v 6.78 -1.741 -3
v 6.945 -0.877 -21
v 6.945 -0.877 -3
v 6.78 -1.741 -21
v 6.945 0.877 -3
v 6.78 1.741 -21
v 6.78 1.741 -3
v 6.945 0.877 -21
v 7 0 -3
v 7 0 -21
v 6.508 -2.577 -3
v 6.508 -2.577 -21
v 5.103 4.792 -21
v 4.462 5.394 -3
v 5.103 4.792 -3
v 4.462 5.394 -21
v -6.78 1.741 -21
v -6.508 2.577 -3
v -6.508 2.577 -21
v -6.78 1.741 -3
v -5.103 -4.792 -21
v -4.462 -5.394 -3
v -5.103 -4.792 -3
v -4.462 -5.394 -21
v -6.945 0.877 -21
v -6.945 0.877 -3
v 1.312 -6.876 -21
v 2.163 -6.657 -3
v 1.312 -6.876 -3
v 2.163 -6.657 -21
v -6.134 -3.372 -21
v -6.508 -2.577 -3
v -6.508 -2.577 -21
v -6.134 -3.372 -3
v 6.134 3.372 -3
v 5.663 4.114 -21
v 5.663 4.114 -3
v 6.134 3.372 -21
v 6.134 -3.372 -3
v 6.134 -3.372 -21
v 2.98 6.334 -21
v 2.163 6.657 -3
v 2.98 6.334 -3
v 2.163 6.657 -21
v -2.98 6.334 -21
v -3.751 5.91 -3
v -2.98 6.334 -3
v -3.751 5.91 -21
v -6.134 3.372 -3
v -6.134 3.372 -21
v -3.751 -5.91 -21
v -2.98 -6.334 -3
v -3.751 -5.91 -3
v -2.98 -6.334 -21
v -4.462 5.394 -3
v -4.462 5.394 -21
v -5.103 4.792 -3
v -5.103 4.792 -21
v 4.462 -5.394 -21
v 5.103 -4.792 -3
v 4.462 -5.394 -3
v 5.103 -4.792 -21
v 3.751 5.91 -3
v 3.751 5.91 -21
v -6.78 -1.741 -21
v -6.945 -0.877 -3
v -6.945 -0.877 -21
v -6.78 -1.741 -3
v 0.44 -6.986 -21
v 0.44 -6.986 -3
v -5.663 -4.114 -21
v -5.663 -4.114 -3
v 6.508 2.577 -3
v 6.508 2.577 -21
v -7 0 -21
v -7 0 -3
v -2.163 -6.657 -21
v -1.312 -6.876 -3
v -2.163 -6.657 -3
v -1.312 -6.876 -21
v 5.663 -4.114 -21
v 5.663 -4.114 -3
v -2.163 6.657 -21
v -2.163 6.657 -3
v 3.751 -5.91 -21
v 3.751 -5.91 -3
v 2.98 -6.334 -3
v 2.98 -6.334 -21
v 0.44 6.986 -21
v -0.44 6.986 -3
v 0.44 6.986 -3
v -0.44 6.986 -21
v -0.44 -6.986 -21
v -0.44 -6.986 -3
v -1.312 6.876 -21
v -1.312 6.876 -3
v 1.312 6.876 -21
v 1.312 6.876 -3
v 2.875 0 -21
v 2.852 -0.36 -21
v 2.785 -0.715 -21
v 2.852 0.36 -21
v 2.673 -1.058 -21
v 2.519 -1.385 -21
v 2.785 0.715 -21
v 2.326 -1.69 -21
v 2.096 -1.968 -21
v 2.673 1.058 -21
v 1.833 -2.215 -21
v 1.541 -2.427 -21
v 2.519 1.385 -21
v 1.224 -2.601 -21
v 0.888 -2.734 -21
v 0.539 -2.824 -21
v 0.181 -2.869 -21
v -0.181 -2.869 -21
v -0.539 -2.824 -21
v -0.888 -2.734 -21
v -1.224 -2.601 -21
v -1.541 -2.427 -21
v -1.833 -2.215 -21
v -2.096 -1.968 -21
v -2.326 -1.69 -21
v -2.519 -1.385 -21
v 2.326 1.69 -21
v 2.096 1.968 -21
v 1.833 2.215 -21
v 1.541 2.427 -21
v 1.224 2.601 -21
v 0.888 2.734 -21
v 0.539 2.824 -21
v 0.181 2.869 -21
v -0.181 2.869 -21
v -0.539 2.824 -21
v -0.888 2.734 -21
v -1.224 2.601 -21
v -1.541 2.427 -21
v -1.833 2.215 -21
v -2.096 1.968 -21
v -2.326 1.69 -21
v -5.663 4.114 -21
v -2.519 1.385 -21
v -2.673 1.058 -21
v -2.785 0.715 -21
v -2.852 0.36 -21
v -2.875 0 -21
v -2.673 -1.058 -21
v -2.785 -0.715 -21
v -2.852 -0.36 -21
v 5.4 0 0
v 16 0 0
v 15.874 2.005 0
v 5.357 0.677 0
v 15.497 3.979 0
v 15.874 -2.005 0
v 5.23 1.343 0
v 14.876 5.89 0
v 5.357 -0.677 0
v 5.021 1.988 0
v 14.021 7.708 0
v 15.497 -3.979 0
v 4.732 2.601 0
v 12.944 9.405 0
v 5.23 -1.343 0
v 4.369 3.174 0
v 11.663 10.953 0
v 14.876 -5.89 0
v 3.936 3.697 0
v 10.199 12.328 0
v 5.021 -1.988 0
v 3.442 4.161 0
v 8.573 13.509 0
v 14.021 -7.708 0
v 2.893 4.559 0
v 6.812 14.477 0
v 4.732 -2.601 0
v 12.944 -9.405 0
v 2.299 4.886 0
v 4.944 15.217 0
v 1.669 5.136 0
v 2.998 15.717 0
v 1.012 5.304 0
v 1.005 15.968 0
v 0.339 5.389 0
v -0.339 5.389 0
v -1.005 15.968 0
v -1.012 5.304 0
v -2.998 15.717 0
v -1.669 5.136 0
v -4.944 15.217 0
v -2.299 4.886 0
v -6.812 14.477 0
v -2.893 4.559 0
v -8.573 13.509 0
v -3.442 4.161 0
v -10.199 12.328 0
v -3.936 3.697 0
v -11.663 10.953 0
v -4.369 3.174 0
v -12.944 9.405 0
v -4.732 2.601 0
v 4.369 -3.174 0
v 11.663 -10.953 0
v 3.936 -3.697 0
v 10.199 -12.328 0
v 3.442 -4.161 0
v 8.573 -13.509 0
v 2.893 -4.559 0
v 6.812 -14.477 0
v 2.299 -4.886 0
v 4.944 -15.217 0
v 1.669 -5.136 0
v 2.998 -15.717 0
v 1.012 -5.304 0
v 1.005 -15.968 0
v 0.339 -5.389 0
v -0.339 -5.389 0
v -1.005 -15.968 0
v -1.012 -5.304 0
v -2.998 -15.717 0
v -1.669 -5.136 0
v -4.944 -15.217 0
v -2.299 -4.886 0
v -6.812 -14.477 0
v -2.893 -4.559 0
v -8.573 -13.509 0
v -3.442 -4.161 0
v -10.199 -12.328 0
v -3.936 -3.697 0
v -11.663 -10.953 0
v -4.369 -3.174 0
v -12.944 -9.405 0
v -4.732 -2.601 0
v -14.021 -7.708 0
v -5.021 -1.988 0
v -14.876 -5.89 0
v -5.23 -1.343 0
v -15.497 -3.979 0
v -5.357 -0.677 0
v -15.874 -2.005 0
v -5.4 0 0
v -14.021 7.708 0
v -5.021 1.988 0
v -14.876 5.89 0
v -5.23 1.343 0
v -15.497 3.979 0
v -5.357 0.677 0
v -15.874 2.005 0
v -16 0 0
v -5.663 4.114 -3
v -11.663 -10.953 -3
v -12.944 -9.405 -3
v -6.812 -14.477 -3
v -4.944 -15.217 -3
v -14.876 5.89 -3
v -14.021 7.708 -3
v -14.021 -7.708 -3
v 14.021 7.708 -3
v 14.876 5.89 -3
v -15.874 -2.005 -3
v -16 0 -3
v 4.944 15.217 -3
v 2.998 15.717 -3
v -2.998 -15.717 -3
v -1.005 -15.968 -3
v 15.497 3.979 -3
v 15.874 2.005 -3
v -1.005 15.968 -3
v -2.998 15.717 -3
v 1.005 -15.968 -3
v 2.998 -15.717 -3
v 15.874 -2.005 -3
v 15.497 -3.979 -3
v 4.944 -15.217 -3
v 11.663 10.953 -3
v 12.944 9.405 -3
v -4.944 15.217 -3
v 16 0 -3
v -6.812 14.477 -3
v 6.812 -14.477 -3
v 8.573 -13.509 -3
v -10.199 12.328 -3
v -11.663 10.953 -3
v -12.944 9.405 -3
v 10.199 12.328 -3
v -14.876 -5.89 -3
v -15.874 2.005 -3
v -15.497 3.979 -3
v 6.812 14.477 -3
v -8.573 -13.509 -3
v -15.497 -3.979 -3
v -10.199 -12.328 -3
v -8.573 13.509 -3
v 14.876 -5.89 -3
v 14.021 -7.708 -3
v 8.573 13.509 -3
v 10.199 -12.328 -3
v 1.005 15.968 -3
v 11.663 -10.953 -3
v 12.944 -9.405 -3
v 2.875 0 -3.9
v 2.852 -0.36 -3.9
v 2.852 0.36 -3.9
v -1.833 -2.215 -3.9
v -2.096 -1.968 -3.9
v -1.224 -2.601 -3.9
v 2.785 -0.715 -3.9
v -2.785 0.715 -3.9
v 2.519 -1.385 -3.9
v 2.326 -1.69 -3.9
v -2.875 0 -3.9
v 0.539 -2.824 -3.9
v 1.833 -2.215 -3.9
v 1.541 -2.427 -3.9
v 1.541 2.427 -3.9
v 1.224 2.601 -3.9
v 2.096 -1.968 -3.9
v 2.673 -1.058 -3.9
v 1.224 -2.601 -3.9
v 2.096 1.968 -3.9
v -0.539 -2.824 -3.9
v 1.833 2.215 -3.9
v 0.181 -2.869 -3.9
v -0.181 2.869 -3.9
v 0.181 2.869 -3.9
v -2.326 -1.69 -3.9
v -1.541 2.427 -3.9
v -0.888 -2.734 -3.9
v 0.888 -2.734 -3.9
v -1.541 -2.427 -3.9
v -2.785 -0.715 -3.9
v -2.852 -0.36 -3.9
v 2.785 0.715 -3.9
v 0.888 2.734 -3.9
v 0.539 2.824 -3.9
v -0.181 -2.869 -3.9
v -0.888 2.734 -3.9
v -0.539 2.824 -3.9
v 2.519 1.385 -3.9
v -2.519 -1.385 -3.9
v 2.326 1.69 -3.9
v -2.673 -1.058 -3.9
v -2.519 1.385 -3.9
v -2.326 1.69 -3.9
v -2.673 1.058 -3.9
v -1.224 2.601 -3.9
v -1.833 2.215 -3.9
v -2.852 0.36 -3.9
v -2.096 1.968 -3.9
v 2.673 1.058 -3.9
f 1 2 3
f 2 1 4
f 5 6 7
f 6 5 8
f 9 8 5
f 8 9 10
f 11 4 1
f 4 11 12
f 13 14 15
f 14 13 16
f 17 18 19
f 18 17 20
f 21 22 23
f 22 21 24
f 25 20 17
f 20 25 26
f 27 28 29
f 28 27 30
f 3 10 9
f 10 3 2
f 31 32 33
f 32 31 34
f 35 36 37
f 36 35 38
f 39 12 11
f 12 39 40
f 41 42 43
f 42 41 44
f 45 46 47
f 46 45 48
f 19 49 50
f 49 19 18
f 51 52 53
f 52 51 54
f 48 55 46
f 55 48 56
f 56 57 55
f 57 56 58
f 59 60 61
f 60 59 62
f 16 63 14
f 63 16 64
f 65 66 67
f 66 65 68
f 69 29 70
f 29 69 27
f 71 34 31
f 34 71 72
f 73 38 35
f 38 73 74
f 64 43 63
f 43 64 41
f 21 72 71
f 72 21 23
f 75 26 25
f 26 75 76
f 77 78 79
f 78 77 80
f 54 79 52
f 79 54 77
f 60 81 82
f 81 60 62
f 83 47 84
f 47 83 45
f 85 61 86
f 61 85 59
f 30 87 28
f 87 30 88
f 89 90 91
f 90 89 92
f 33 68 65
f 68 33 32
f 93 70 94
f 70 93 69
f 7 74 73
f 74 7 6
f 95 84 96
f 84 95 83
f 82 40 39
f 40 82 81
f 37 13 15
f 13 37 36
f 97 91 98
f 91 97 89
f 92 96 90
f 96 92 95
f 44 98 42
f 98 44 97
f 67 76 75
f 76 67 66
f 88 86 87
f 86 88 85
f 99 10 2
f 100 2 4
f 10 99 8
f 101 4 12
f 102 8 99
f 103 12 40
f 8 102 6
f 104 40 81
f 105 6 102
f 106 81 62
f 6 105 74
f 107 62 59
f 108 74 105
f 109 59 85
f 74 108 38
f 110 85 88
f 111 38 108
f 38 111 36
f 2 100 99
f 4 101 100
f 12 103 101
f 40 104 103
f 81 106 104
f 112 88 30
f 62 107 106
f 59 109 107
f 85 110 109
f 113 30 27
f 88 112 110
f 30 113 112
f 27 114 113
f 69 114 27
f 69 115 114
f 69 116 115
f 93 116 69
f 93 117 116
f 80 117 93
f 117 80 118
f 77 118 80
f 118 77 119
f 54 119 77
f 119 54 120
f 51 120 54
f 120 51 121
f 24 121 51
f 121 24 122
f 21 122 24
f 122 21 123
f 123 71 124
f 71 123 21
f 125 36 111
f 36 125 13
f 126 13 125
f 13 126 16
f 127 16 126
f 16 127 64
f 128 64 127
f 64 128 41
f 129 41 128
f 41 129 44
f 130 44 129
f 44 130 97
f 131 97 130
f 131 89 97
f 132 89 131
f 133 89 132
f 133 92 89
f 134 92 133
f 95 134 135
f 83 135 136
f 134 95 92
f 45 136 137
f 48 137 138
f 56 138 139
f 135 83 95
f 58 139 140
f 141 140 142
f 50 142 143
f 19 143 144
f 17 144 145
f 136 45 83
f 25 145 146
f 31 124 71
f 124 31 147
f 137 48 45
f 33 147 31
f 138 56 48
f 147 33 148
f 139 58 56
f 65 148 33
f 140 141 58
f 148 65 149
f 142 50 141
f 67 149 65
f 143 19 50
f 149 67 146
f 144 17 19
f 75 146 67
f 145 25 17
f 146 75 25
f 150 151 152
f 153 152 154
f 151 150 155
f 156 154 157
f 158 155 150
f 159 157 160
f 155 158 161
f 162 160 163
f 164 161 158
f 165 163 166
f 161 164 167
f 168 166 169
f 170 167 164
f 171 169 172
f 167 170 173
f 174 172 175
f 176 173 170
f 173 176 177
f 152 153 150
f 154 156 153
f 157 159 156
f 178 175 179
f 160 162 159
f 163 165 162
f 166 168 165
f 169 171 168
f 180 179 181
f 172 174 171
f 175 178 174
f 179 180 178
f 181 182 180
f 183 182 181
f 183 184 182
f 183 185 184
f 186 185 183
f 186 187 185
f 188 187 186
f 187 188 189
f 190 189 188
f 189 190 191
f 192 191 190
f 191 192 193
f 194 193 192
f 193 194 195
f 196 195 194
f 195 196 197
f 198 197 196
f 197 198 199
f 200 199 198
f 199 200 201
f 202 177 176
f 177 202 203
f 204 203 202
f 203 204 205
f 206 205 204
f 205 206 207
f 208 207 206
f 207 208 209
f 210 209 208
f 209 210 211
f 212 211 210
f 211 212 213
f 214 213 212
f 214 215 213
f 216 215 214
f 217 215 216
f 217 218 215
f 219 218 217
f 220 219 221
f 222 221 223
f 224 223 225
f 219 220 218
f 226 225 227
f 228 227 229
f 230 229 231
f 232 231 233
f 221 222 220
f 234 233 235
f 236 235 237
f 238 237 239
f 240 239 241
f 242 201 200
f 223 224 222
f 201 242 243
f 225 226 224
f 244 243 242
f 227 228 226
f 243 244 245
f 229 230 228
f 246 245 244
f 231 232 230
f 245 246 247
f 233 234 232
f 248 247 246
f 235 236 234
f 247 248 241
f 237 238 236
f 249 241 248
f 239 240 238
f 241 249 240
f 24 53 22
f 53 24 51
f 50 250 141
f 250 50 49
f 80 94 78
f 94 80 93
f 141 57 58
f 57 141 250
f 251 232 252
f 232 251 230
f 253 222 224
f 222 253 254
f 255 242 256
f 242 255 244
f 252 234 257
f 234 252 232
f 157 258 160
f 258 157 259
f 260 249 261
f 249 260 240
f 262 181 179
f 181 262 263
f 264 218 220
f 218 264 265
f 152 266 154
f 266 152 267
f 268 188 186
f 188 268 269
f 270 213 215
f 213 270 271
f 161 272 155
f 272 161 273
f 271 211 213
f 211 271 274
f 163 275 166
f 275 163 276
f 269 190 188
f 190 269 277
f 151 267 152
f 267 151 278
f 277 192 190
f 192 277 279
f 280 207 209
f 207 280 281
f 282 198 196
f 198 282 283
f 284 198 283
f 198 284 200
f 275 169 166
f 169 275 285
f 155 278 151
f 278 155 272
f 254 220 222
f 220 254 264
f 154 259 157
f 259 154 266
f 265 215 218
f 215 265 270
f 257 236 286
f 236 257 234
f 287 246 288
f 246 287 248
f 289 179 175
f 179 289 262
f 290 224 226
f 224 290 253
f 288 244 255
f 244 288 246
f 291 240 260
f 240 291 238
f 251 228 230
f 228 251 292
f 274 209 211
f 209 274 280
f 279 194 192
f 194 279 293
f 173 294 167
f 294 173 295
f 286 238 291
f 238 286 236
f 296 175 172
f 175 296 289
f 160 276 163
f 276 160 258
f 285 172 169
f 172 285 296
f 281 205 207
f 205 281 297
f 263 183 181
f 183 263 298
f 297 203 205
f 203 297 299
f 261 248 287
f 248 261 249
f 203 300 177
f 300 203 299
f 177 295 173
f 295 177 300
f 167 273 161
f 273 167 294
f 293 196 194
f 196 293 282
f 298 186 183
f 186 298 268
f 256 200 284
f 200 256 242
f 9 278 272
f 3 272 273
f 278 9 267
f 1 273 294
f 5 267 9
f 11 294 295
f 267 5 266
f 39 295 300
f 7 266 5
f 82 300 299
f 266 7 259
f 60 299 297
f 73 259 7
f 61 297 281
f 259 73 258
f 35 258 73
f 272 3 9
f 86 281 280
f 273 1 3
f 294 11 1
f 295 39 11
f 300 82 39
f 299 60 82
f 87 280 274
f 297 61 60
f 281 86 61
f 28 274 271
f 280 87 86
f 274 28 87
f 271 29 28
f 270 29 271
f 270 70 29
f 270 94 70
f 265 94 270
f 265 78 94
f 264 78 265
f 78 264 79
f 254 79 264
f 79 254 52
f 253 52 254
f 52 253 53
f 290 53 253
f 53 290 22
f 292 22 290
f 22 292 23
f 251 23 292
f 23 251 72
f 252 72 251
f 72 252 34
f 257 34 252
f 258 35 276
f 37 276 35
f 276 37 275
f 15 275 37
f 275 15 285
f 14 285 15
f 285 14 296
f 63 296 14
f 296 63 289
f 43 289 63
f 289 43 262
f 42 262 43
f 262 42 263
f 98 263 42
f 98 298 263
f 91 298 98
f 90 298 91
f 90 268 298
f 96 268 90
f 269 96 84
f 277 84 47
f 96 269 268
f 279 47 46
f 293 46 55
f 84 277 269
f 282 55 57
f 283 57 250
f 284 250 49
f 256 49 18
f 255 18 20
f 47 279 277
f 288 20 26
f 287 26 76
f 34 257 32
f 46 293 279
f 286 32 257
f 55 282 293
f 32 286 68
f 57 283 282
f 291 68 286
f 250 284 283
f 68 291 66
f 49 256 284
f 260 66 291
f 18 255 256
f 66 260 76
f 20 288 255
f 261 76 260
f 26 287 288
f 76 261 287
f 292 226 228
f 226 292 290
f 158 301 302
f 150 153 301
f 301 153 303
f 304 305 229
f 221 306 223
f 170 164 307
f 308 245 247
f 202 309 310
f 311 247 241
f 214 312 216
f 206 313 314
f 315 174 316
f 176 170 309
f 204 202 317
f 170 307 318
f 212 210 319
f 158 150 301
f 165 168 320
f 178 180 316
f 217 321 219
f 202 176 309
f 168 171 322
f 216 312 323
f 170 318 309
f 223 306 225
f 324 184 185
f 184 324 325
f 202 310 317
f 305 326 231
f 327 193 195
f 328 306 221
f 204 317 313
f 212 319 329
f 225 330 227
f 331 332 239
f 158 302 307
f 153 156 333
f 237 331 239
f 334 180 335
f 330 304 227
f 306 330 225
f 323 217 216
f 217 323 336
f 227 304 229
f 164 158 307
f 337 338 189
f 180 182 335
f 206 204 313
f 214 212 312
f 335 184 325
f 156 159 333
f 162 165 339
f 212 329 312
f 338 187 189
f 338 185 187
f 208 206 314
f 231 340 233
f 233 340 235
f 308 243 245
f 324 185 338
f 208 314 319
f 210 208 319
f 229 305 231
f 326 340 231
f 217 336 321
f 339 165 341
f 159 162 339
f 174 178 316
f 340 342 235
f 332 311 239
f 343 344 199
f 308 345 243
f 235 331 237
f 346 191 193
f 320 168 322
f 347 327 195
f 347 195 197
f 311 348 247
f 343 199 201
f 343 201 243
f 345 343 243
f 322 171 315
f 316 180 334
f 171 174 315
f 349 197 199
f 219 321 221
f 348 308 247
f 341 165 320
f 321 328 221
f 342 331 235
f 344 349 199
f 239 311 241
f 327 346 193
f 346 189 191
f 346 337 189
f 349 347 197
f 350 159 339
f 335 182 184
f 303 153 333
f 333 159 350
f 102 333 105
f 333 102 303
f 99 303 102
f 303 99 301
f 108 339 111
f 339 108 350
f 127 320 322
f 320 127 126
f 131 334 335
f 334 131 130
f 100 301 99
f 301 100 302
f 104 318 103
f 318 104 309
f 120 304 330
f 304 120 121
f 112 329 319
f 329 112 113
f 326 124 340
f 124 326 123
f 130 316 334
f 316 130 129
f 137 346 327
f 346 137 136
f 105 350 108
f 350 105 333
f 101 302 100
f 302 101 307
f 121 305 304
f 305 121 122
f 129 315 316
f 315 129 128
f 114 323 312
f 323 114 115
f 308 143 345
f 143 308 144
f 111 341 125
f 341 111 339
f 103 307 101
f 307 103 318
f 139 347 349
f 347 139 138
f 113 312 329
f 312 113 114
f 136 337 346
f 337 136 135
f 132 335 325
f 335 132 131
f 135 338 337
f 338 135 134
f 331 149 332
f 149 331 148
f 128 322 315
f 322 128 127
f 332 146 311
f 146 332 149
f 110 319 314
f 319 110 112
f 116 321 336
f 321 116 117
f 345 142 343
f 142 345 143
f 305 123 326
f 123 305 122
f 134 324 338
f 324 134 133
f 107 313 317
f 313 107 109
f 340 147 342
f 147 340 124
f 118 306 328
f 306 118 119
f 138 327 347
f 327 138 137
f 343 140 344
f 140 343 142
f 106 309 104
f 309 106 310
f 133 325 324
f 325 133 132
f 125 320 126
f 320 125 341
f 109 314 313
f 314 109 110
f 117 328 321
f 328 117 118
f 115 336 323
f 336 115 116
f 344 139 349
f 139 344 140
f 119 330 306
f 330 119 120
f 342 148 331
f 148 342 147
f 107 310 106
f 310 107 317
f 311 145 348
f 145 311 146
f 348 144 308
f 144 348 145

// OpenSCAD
$fn = 50;


difference() {
	union() {
		translate(v = [0, 0, -21.0000000000]) {
			cylinder(h = 21, r = 7.0000000000);
		}
		translate(v = [0, 0, -3.0000000000]) {
			cylinder(h = 3, r = 16.0000000000);
		}
	}
	union() {
		translate(v = [0, 0, 0]) {
			rotate(a = [0, 0, 0]) {
				difference() {
					union() {
						#translate(v = [0, 0, -21.0000000000]) {
							cylinder(h = 21, r = 2.6000000000);
						}
						#translate(v = [0, 0, -3.9000000000]) {
							cylinder(h = 3.9000000000, r = 7.0000000000, r1 = 2.8750000000, r2 = 5.4000000000);
						}
						#translate(v = [0, 0, -21.0000000000]) {
							cylinder(h = 21, r = 2.8750000000);
						}
						#translate(v = [0, 0, -21.0000000000]) {
							cylinder(h = 21, r = 2.6000000000);
						}
					}
					union();
				}
			}
		}
	}
}
